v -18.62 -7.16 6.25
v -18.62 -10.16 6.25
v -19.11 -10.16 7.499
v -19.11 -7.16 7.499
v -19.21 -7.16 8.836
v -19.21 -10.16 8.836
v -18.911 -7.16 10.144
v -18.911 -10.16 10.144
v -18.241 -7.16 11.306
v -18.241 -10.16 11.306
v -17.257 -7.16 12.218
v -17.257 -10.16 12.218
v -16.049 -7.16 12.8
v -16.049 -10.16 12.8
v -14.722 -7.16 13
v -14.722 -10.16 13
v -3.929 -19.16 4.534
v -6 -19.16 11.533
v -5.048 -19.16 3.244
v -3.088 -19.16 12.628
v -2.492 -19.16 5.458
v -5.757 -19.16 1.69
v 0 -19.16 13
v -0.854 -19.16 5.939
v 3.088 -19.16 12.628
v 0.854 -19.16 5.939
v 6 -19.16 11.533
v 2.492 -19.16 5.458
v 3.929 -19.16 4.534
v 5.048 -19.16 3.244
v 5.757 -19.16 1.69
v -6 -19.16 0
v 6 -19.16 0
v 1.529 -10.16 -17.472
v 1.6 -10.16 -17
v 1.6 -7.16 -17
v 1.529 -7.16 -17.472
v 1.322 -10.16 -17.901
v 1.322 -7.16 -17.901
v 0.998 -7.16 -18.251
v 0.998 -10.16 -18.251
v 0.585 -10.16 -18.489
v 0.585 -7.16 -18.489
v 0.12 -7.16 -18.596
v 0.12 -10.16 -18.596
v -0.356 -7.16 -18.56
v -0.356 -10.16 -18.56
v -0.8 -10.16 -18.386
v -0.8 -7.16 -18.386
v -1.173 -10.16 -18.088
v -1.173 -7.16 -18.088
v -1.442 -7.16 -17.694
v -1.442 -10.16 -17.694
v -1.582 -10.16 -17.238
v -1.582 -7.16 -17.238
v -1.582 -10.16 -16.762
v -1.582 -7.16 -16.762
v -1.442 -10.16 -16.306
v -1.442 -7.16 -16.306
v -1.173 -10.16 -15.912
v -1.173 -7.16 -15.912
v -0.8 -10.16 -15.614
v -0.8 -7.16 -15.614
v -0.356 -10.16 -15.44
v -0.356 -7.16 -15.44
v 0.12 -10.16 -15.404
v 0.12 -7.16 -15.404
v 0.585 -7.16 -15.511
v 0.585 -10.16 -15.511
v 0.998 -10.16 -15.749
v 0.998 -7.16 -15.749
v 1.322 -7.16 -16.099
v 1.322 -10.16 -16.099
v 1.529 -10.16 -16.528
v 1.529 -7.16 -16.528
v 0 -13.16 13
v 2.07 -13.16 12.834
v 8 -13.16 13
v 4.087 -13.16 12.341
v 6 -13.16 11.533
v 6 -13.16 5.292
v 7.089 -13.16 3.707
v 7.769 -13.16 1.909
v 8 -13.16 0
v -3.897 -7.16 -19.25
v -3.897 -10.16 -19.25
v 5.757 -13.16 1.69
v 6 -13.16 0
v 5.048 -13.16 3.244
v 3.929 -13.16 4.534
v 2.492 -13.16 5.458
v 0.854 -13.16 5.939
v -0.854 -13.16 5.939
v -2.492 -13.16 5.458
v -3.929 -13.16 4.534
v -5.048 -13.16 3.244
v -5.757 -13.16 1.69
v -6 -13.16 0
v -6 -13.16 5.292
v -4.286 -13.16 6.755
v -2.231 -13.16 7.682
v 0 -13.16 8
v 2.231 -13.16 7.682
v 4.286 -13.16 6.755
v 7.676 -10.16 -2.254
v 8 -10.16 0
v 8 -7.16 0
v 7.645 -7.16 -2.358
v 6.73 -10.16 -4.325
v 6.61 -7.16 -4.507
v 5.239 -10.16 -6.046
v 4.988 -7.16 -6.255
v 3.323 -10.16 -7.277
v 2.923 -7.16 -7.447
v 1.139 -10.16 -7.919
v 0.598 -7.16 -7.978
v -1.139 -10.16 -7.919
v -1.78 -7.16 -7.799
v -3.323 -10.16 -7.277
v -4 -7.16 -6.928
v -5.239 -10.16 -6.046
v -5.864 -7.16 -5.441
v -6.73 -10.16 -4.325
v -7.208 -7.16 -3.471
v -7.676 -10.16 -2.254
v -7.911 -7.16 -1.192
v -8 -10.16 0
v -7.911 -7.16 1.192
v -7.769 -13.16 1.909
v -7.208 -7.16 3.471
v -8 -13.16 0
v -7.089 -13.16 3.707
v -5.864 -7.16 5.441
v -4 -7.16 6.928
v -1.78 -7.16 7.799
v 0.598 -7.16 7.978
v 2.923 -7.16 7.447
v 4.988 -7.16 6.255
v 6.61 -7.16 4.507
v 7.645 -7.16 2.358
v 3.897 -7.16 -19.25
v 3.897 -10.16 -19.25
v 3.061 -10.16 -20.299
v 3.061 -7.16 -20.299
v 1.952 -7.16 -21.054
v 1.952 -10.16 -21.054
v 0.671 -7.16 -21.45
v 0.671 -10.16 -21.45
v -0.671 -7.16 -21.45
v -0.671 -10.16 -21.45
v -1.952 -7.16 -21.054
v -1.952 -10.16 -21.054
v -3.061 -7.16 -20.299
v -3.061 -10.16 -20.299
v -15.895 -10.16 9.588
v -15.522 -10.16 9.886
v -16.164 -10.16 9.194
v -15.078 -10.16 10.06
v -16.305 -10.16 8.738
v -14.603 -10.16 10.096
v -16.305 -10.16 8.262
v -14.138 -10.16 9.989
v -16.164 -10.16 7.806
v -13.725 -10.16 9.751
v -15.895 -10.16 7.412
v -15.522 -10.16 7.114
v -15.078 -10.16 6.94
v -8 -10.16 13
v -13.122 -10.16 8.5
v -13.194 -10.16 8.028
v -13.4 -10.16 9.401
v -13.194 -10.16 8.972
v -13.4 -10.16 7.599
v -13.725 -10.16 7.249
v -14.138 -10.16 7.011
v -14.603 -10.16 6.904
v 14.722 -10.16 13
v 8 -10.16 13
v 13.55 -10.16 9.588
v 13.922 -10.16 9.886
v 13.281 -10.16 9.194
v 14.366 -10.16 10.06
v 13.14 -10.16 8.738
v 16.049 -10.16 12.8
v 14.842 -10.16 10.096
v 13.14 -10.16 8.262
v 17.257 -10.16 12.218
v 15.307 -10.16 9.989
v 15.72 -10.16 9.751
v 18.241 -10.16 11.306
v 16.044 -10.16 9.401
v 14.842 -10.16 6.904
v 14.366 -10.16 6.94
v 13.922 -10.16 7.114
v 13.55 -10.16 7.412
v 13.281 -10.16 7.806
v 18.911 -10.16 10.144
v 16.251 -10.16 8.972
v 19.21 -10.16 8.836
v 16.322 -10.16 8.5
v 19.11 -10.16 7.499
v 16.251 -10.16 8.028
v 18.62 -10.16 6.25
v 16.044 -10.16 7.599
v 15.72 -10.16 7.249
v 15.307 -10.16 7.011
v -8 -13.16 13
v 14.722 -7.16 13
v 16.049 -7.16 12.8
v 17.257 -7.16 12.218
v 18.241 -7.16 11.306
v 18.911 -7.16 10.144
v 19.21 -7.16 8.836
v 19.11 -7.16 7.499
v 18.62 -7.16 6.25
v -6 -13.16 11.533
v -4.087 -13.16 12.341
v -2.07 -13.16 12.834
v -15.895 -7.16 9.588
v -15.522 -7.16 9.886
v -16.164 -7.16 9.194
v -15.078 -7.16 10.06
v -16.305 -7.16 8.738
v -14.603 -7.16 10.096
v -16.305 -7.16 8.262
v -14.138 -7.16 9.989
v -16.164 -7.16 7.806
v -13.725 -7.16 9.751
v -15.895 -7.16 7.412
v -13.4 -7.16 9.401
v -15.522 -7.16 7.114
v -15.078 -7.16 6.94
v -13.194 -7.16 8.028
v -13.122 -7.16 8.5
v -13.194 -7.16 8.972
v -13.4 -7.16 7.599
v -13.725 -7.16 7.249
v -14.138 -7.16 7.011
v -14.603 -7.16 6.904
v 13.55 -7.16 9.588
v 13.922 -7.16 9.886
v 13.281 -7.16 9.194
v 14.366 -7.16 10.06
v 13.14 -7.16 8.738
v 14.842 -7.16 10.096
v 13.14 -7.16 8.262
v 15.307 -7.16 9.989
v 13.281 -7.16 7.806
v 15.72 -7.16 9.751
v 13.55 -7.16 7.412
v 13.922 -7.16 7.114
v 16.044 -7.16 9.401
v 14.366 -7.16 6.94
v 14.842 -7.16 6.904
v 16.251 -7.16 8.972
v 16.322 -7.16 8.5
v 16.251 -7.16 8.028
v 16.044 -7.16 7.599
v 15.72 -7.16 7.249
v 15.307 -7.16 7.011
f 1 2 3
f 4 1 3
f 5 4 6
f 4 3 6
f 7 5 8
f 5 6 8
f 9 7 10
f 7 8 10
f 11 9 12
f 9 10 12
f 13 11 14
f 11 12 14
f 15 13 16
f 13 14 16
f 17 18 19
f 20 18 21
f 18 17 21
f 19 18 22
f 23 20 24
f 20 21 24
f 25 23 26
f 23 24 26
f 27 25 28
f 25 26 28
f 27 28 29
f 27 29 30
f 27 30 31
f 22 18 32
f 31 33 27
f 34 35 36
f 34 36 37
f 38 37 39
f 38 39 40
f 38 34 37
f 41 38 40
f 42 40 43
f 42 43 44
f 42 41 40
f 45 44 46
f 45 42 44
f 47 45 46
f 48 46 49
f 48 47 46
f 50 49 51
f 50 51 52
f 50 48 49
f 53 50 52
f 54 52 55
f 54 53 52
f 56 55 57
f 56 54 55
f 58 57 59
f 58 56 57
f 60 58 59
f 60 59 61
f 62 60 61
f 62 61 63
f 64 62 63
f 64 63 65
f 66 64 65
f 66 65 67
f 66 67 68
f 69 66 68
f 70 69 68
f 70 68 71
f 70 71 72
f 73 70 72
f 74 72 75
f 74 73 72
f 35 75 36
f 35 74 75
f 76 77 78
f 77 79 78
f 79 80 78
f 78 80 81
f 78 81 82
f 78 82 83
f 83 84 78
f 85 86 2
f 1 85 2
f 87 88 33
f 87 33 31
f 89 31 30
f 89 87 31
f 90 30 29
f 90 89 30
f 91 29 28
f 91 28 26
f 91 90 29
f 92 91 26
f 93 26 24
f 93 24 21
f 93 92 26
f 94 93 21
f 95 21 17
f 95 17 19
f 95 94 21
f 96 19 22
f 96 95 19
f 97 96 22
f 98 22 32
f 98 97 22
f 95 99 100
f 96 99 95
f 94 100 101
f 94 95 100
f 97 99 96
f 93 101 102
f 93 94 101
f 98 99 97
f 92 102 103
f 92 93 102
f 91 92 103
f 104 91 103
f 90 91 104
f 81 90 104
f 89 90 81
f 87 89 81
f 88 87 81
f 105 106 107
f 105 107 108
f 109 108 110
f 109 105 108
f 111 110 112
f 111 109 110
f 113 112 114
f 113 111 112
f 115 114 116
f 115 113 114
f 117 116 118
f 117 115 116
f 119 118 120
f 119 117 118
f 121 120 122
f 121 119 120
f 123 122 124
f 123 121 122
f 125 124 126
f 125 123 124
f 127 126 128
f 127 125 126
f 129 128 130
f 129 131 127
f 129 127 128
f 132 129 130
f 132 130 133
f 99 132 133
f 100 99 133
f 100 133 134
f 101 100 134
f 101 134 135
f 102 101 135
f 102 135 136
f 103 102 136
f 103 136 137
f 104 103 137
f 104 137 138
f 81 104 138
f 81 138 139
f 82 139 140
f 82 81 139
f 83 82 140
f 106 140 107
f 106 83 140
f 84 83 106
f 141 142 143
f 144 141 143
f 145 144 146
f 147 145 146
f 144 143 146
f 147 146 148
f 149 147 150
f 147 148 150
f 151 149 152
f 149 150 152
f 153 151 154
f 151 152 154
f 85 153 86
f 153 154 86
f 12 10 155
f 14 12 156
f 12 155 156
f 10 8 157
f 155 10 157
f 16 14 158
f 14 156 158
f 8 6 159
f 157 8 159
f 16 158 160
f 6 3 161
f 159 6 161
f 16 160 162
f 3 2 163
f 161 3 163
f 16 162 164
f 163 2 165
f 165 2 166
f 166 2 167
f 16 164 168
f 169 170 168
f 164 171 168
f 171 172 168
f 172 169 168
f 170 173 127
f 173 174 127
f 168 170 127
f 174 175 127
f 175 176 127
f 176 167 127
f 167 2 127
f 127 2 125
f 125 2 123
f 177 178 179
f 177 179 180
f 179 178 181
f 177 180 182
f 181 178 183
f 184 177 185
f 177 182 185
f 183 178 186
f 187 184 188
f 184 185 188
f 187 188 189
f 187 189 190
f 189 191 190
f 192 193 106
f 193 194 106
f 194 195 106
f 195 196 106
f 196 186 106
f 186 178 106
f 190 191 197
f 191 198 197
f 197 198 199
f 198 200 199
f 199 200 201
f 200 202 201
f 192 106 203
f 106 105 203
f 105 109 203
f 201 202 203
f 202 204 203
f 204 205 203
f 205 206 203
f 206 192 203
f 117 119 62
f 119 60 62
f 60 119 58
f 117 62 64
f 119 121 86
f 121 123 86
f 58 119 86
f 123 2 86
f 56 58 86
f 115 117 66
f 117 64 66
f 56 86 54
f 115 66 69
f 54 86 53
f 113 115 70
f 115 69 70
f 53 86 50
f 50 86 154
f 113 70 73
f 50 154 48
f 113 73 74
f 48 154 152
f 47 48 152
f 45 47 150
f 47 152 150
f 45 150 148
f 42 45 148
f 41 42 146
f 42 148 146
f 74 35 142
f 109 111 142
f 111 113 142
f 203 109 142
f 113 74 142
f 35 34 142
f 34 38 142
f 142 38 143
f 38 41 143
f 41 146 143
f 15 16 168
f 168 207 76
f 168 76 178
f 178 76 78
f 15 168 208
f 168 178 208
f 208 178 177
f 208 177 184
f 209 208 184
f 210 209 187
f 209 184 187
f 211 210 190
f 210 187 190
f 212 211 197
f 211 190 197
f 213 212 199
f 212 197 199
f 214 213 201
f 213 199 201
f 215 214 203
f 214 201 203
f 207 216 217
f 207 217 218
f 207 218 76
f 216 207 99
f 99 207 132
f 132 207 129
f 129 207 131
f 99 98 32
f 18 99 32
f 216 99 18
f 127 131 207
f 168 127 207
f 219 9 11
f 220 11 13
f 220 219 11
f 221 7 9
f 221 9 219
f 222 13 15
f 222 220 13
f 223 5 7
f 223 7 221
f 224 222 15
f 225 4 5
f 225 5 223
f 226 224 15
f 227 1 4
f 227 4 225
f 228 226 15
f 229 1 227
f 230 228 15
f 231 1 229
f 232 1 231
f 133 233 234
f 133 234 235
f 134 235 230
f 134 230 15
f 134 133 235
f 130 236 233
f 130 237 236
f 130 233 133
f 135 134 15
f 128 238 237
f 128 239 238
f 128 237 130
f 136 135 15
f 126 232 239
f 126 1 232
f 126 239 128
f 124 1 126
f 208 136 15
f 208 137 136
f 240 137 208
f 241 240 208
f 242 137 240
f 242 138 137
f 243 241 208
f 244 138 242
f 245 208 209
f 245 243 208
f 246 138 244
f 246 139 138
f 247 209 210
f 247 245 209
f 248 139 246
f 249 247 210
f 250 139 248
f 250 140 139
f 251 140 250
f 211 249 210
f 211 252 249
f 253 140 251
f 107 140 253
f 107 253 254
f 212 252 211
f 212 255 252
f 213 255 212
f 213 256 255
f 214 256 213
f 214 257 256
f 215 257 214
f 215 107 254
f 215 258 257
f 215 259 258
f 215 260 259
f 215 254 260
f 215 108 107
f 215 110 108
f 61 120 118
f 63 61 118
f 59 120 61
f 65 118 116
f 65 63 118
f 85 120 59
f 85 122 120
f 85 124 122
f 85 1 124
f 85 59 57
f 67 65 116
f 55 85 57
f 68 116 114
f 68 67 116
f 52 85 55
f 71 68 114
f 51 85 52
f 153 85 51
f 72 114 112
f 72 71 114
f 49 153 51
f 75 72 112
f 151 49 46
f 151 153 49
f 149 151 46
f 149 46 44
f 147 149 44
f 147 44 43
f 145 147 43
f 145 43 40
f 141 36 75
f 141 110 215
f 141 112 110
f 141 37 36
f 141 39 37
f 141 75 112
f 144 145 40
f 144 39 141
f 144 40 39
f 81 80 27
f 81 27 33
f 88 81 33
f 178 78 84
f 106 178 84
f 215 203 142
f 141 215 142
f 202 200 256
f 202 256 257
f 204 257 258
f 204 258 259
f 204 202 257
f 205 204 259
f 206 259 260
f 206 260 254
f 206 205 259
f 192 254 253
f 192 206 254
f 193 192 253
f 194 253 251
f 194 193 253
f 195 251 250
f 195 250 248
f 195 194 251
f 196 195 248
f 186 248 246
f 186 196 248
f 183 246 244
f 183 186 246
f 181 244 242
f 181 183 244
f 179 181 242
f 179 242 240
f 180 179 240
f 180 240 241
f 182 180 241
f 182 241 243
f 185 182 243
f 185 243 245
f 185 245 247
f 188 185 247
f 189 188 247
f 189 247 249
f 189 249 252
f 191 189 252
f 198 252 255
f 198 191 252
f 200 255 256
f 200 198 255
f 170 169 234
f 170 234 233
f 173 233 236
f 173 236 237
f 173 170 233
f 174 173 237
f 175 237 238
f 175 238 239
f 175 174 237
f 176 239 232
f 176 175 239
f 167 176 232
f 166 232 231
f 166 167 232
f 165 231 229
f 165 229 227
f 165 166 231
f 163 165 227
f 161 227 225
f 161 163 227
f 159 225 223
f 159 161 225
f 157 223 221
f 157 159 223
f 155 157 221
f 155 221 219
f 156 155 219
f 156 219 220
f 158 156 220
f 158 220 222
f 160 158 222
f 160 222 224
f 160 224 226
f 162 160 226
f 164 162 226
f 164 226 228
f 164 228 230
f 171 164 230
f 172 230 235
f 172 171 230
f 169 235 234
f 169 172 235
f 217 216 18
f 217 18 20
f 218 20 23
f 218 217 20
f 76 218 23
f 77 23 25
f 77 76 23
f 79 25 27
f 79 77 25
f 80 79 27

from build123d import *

# Parameters (mm, degrees)
EXTRUDE_1_DEPTH   = 6
EXTRUDE_2_DEPTH   = 3
SKETCH_4_R        = 8
EXTRUDE_3_DEPTH   = 3
OTHER_START       = -10.160108376
OTHER_1_OUTLINE_R = 1.6
OTHER_1_DEPTH     = 3


# Read off the part's stored shape, not the designer's step: 高级异型孔1
with BuildPart() as part:
    # 草图1 → 凸台-拉伸1 (new body)
    with BuildSketch(Plane(origin=(0, -13.160108376, 0), x_dir=(1, 0, 0), z_dir=(0, 1, 0))):
        with BuildLine():
            Line((-6, 0), (-6, -11.532562595))
            ThreePointArc((-6, -11.532562595), (0, -13), (6, -11.532562595))
            Line((6, -11.532562595), (6, 0))
            ThreePointArc((6, 0), (0, -6), (-6, 0))
        make_face()
    extrude(amount=-EXTRUDE_1_DEPTH)

    # 草图2 → 凸台-拉伸2 (add)
    with BuildSketch(Plane(origin=(0, -13.160108376, 0), x_dir=(1, 0, 0), z_dir=(0, 1, 0))):
        with BuildLine():
            Line((-8, 0), (-8, -13))
            Line((-8, -13), (8, -13))
            Line((8, -13), (8, 0))
            ThreePointArc((8, 0), (0, -8), (-8, 0))
        make_face()
    extrude(amount=EXTRUDE_2_DEPTH)

    # 草图4 → 凸台-拉伸3 (add)
    with BuildSketch(Plane(origin=(0, -10.160108376, -27), x_dir=(1, 0, 0), z_dir=(0, 1, 0))):
        with BuildLine():
            Line((-3.897114317, -7.75), (-18.619546181, -33.25))
            ThreePointArc((-18.619546181, -33.25), (-18.619546181, -37.75), (-14.722431864, -40))
            Line((-14.722431864, -40), (14.722431864, -40))
            ThreePointArc((14.722431864, -40), (18.619546181, -37.75), (18.619546181, -33.25))
            Line((18.619546181, -33.25), (3.897114317, -7.75))
            ThreePointArc((3.897114317, -7.75), (0, -5.5), (-3.897114317, -7.75))
        make_face()
        with Locations((0, -27)):
            Circle(SKETCH_4_R, mode=Mode.SUBTRACT)
    extrude(amount=EXTRUDE_3_DEPTH)

    # 高级异型孔1 outline → 高级异型孔1 (cut)
    with BuildSketch(Plane(origin=(0, 0, 0), x_dir=(1, 0, 0), z_dir=(0, 1, 0)).offset(OTHER_START)):
        with Locations((-14.722431864, -8.5)):
            Circle(OTHER_1_OUTLINE_R)
        with Locations((14.722431864, -8.5)):
            Circle(OTHER_1_OUTLINE_R)
        with Locations((0, 17)):
            Circle(OTHER_1_OUTLINE_R)
    extrude(amount=OTHER_1_DEPTH, mode=Mode.SUBTRACT)


solid = part.part
